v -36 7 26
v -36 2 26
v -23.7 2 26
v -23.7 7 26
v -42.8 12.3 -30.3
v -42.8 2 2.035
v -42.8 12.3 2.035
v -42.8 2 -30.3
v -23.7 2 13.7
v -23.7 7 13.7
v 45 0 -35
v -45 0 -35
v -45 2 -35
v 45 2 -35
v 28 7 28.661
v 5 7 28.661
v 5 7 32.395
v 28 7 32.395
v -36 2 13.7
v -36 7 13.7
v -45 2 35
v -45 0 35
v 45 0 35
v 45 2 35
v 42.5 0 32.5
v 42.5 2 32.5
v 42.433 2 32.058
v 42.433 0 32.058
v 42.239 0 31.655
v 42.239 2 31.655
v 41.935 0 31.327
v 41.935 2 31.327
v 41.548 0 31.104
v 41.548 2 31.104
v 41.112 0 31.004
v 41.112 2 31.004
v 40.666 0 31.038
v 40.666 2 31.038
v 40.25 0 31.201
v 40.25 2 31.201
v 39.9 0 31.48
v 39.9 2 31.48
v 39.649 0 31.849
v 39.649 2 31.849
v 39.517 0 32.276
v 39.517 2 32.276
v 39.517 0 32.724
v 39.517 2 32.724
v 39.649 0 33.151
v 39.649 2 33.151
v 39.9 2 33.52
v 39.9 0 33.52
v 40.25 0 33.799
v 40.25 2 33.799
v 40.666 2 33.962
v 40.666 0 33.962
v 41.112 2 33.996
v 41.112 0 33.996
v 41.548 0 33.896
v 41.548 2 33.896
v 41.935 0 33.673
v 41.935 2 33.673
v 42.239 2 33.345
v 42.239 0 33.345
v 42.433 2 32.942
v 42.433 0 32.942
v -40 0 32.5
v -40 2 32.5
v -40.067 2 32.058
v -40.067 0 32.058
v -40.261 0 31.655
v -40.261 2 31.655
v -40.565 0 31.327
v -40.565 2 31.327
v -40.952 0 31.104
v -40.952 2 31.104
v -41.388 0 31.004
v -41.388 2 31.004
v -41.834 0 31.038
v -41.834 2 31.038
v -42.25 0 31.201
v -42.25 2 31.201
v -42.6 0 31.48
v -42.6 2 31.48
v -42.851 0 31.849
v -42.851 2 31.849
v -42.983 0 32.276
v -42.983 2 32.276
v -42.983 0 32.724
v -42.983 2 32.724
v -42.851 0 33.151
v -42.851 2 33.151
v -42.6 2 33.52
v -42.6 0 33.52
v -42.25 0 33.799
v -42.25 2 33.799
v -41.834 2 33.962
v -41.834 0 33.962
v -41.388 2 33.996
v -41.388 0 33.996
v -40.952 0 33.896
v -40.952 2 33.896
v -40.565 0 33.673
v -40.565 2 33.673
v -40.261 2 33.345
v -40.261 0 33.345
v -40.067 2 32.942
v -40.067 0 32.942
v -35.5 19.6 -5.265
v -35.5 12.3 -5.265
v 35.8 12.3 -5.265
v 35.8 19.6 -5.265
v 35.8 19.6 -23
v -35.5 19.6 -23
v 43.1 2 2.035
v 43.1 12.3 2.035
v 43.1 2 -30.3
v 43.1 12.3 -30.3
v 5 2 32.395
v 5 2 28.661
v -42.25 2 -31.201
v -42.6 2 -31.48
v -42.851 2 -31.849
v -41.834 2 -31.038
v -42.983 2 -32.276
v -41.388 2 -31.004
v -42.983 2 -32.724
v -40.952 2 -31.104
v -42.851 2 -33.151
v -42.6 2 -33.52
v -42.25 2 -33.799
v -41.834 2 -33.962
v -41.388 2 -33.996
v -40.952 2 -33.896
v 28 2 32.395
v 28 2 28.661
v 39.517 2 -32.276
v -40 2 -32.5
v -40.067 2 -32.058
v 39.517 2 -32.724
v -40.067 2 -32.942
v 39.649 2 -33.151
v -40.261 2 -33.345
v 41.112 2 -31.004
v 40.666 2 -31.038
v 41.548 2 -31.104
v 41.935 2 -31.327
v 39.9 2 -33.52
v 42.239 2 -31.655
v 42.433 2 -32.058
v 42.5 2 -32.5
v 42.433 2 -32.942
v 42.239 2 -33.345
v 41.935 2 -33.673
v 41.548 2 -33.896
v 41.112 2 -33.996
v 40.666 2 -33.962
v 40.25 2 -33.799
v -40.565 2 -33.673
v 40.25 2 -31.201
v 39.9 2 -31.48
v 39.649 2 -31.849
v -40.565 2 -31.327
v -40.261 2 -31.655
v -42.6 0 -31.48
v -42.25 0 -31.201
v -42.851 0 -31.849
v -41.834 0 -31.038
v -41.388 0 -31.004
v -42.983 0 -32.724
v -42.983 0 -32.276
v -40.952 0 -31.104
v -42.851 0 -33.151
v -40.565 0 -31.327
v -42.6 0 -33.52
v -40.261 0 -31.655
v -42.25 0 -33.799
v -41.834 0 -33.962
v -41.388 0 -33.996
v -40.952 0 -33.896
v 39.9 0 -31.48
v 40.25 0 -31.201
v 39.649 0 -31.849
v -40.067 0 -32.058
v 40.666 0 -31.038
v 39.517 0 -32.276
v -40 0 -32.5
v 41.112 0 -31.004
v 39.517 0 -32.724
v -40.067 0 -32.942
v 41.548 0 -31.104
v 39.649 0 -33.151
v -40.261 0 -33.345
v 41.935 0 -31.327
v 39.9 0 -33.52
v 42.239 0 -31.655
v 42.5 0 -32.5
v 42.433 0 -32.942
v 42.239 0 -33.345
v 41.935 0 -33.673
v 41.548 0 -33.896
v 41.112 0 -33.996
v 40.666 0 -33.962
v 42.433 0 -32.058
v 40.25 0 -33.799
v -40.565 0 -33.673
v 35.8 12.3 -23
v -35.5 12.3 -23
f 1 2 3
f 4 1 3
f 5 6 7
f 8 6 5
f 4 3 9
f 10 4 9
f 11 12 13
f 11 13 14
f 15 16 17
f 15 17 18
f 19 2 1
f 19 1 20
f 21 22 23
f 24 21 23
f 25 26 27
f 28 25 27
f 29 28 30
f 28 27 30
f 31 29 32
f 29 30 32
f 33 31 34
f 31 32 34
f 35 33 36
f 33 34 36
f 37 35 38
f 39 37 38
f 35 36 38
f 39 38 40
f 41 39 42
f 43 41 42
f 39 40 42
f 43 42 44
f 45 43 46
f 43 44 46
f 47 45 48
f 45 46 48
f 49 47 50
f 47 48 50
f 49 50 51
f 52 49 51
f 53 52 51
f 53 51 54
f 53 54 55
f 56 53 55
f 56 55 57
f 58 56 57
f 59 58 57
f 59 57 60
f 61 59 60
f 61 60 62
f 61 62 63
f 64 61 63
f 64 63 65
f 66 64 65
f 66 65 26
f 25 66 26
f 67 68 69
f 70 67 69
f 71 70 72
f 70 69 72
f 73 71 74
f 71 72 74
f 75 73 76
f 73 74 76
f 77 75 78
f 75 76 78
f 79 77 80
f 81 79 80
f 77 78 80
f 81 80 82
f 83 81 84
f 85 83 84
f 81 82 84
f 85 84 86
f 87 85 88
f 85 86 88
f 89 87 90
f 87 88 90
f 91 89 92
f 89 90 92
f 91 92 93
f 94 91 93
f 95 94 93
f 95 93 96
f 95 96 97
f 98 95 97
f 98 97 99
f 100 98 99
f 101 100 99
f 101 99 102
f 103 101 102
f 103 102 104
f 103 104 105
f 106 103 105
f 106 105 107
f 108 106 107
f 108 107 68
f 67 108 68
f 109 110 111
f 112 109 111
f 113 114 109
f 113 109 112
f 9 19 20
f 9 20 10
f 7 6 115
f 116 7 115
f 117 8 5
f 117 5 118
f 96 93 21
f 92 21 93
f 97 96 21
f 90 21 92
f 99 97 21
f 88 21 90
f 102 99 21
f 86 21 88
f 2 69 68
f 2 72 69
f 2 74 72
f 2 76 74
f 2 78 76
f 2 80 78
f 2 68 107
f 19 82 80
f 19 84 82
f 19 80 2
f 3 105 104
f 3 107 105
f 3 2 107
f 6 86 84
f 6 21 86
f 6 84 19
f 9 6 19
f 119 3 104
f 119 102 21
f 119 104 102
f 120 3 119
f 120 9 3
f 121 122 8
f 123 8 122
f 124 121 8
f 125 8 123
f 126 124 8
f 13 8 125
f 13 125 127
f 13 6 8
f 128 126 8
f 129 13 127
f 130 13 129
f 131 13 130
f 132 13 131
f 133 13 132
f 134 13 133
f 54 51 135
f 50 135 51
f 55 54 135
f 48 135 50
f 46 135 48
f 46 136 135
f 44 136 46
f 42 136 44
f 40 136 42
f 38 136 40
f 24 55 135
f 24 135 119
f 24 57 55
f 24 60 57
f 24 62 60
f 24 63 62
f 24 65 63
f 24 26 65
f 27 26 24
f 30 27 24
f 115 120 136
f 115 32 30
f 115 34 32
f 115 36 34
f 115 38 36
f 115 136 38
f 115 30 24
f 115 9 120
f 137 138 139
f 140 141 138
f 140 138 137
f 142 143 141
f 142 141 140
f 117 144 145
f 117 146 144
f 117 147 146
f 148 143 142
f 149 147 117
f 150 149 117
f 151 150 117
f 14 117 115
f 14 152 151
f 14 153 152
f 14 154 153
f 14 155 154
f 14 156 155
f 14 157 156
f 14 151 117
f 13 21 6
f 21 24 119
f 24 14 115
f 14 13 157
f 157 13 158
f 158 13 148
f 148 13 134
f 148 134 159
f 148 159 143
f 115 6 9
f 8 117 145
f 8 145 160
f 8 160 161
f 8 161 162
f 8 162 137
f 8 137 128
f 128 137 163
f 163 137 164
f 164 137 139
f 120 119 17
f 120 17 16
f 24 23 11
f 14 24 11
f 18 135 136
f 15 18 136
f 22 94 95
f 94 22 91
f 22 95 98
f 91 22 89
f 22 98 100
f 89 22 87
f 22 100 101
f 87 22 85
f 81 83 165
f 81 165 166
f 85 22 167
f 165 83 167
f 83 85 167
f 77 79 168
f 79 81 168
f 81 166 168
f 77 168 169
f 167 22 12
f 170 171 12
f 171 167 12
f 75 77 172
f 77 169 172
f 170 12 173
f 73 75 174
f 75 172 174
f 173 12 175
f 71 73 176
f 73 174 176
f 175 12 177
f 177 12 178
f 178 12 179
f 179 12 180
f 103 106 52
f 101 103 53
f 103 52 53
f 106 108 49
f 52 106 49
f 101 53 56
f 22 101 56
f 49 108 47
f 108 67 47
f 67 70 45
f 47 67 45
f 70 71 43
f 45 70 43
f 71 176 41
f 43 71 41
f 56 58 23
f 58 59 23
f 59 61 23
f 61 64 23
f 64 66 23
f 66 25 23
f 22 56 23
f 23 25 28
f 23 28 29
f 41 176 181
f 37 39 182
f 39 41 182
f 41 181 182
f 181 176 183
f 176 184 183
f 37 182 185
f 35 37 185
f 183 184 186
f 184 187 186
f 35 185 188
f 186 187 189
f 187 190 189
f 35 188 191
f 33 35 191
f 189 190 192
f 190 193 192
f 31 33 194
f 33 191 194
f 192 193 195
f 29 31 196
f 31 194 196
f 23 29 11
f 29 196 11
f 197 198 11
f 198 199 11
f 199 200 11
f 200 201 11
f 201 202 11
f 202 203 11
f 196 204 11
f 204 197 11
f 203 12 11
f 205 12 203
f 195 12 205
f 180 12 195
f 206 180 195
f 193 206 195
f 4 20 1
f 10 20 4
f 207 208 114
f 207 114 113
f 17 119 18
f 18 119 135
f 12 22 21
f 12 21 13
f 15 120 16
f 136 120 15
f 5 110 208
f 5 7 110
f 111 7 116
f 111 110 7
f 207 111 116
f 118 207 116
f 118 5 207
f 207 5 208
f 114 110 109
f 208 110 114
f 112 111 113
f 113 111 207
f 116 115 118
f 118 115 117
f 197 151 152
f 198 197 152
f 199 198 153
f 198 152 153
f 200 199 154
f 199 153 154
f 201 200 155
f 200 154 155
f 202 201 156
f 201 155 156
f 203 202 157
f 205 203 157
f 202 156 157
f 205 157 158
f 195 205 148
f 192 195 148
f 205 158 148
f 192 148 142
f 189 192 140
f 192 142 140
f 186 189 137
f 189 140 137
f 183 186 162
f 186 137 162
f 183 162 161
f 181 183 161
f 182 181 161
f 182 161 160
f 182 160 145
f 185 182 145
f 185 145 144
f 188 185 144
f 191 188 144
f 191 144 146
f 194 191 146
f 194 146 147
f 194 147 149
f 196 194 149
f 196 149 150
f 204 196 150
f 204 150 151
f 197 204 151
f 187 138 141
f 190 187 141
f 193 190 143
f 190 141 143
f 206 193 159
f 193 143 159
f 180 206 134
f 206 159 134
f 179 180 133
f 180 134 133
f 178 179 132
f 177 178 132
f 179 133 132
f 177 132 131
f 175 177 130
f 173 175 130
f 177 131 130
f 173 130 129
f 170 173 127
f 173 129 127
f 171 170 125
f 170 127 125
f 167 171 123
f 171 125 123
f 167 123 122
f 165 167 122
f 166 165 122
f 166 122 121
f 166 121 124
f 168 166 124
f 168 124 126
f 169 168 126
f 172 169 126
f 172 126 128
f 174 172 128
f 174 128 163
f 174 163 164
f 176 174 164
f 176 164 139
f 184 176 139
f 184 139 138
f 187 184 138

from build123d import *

# Parameters (mm, degrees)
SKETCH1_W           = 90
SKETCH1_H           = 70
BOSS_EXTRUDE1_DEPTH = 2
SKETCH2_R           = 1.5
CUT_EXTRUDE1_DEPTH  = 3
SKETCH3_W           = 23
SKETCH3_H           = 3.733741838
SKETCH3_W_2         = 12.3
SKETCH3_H_2         = 12.3
BOSS_EXTRUDE2_DEPTH = 5
SKETCH4_W           = 71.3
SKETCH4_H           = 17.735180651
BOSS_EXTRUDE3_DEPTH = 17.6
SKETCH5_W           = 85.9
SKETCH5_H           = 32.335180651
BOSS_EXTRUDE4_DEPTH = 10.3


with BuildPart() as part:
    # Sketch1 → Boss-Extrude1 (new body)
    with BuildSketch(Plane(origin=(0, 0, 0), x_dir=(1, 0, 0), z_dir=(0, 1, 0))):
        Rectangle(SKETCH1_W, SKETCH1_H)
    extrude(amount=BOSS_EXTRUDE1_DEPTH)

    # Sketch2 → Cut-Extrude1 (cut, through all)
    with BuildSketch(Plane(origin=(0, 2, 0), x_dir=(1, 0, 0), z_dir=(0, 1, 0))):
        with Locations((-41.5, 32.5)):
            Circle(SKETCH2_R)
        with Locations((-41.5, -32.5)):
            Circle(SKETCH2_R)
        with Locations((41, -32.5)):
            Circle(SKETCH2_R)
        with Locations((41, 32.5)):
            Circle(SKETCH2_R)
    extrude(amount=-CUT_EXTRUDE1_DEPTH, mode=Mode.SUBTRACT)

    # Sketch3 → Boss-Extrude2 (add)
    with BuildSketch(Plane(origin=(0, 2, 0), x_dir=(1, 0, 0), z_dir=(0, 1, 0))):
        with Locations((16.5, -30.528214904)):
            Rectangle(SKETCH3_W, SKETCH3_H)
        with Locations((-29.85, -19.85)):
            Rectangle(SKETCH3_W_2, SKETCH3_H_2)
    extrude(amount=BOSS_EXTRUDE2_DEPTH)

    # Sketch4 → Boss-Extrude3 (add)
    with BuildSketch(Plane(origin=(0, 2, 0), x_dir=(1, 0, 0), z_dir=(0, 1, 0))):
        with Locations((0.15, 14.132409674)):
            Rectangle(SKETCH4_W, SKETCH4_H)
    extrude(amount=BOSS_EXTRUDE3_DEPTH)

    # Sketch5 → Boss-Extrude4 (add)
    with BuildSketch(Plane(origin=(0, 2, 0), x_dir=(1, 0, 0), z_dir=(0, 1, 0))):
        with Locations((0.15, 14.132409674)):
            Rectangle(SKETCH5_W, SKETCH5_H)
    extrude(amount=BOSS_EXTRUDE4_DEPTH)


solid = part.part
